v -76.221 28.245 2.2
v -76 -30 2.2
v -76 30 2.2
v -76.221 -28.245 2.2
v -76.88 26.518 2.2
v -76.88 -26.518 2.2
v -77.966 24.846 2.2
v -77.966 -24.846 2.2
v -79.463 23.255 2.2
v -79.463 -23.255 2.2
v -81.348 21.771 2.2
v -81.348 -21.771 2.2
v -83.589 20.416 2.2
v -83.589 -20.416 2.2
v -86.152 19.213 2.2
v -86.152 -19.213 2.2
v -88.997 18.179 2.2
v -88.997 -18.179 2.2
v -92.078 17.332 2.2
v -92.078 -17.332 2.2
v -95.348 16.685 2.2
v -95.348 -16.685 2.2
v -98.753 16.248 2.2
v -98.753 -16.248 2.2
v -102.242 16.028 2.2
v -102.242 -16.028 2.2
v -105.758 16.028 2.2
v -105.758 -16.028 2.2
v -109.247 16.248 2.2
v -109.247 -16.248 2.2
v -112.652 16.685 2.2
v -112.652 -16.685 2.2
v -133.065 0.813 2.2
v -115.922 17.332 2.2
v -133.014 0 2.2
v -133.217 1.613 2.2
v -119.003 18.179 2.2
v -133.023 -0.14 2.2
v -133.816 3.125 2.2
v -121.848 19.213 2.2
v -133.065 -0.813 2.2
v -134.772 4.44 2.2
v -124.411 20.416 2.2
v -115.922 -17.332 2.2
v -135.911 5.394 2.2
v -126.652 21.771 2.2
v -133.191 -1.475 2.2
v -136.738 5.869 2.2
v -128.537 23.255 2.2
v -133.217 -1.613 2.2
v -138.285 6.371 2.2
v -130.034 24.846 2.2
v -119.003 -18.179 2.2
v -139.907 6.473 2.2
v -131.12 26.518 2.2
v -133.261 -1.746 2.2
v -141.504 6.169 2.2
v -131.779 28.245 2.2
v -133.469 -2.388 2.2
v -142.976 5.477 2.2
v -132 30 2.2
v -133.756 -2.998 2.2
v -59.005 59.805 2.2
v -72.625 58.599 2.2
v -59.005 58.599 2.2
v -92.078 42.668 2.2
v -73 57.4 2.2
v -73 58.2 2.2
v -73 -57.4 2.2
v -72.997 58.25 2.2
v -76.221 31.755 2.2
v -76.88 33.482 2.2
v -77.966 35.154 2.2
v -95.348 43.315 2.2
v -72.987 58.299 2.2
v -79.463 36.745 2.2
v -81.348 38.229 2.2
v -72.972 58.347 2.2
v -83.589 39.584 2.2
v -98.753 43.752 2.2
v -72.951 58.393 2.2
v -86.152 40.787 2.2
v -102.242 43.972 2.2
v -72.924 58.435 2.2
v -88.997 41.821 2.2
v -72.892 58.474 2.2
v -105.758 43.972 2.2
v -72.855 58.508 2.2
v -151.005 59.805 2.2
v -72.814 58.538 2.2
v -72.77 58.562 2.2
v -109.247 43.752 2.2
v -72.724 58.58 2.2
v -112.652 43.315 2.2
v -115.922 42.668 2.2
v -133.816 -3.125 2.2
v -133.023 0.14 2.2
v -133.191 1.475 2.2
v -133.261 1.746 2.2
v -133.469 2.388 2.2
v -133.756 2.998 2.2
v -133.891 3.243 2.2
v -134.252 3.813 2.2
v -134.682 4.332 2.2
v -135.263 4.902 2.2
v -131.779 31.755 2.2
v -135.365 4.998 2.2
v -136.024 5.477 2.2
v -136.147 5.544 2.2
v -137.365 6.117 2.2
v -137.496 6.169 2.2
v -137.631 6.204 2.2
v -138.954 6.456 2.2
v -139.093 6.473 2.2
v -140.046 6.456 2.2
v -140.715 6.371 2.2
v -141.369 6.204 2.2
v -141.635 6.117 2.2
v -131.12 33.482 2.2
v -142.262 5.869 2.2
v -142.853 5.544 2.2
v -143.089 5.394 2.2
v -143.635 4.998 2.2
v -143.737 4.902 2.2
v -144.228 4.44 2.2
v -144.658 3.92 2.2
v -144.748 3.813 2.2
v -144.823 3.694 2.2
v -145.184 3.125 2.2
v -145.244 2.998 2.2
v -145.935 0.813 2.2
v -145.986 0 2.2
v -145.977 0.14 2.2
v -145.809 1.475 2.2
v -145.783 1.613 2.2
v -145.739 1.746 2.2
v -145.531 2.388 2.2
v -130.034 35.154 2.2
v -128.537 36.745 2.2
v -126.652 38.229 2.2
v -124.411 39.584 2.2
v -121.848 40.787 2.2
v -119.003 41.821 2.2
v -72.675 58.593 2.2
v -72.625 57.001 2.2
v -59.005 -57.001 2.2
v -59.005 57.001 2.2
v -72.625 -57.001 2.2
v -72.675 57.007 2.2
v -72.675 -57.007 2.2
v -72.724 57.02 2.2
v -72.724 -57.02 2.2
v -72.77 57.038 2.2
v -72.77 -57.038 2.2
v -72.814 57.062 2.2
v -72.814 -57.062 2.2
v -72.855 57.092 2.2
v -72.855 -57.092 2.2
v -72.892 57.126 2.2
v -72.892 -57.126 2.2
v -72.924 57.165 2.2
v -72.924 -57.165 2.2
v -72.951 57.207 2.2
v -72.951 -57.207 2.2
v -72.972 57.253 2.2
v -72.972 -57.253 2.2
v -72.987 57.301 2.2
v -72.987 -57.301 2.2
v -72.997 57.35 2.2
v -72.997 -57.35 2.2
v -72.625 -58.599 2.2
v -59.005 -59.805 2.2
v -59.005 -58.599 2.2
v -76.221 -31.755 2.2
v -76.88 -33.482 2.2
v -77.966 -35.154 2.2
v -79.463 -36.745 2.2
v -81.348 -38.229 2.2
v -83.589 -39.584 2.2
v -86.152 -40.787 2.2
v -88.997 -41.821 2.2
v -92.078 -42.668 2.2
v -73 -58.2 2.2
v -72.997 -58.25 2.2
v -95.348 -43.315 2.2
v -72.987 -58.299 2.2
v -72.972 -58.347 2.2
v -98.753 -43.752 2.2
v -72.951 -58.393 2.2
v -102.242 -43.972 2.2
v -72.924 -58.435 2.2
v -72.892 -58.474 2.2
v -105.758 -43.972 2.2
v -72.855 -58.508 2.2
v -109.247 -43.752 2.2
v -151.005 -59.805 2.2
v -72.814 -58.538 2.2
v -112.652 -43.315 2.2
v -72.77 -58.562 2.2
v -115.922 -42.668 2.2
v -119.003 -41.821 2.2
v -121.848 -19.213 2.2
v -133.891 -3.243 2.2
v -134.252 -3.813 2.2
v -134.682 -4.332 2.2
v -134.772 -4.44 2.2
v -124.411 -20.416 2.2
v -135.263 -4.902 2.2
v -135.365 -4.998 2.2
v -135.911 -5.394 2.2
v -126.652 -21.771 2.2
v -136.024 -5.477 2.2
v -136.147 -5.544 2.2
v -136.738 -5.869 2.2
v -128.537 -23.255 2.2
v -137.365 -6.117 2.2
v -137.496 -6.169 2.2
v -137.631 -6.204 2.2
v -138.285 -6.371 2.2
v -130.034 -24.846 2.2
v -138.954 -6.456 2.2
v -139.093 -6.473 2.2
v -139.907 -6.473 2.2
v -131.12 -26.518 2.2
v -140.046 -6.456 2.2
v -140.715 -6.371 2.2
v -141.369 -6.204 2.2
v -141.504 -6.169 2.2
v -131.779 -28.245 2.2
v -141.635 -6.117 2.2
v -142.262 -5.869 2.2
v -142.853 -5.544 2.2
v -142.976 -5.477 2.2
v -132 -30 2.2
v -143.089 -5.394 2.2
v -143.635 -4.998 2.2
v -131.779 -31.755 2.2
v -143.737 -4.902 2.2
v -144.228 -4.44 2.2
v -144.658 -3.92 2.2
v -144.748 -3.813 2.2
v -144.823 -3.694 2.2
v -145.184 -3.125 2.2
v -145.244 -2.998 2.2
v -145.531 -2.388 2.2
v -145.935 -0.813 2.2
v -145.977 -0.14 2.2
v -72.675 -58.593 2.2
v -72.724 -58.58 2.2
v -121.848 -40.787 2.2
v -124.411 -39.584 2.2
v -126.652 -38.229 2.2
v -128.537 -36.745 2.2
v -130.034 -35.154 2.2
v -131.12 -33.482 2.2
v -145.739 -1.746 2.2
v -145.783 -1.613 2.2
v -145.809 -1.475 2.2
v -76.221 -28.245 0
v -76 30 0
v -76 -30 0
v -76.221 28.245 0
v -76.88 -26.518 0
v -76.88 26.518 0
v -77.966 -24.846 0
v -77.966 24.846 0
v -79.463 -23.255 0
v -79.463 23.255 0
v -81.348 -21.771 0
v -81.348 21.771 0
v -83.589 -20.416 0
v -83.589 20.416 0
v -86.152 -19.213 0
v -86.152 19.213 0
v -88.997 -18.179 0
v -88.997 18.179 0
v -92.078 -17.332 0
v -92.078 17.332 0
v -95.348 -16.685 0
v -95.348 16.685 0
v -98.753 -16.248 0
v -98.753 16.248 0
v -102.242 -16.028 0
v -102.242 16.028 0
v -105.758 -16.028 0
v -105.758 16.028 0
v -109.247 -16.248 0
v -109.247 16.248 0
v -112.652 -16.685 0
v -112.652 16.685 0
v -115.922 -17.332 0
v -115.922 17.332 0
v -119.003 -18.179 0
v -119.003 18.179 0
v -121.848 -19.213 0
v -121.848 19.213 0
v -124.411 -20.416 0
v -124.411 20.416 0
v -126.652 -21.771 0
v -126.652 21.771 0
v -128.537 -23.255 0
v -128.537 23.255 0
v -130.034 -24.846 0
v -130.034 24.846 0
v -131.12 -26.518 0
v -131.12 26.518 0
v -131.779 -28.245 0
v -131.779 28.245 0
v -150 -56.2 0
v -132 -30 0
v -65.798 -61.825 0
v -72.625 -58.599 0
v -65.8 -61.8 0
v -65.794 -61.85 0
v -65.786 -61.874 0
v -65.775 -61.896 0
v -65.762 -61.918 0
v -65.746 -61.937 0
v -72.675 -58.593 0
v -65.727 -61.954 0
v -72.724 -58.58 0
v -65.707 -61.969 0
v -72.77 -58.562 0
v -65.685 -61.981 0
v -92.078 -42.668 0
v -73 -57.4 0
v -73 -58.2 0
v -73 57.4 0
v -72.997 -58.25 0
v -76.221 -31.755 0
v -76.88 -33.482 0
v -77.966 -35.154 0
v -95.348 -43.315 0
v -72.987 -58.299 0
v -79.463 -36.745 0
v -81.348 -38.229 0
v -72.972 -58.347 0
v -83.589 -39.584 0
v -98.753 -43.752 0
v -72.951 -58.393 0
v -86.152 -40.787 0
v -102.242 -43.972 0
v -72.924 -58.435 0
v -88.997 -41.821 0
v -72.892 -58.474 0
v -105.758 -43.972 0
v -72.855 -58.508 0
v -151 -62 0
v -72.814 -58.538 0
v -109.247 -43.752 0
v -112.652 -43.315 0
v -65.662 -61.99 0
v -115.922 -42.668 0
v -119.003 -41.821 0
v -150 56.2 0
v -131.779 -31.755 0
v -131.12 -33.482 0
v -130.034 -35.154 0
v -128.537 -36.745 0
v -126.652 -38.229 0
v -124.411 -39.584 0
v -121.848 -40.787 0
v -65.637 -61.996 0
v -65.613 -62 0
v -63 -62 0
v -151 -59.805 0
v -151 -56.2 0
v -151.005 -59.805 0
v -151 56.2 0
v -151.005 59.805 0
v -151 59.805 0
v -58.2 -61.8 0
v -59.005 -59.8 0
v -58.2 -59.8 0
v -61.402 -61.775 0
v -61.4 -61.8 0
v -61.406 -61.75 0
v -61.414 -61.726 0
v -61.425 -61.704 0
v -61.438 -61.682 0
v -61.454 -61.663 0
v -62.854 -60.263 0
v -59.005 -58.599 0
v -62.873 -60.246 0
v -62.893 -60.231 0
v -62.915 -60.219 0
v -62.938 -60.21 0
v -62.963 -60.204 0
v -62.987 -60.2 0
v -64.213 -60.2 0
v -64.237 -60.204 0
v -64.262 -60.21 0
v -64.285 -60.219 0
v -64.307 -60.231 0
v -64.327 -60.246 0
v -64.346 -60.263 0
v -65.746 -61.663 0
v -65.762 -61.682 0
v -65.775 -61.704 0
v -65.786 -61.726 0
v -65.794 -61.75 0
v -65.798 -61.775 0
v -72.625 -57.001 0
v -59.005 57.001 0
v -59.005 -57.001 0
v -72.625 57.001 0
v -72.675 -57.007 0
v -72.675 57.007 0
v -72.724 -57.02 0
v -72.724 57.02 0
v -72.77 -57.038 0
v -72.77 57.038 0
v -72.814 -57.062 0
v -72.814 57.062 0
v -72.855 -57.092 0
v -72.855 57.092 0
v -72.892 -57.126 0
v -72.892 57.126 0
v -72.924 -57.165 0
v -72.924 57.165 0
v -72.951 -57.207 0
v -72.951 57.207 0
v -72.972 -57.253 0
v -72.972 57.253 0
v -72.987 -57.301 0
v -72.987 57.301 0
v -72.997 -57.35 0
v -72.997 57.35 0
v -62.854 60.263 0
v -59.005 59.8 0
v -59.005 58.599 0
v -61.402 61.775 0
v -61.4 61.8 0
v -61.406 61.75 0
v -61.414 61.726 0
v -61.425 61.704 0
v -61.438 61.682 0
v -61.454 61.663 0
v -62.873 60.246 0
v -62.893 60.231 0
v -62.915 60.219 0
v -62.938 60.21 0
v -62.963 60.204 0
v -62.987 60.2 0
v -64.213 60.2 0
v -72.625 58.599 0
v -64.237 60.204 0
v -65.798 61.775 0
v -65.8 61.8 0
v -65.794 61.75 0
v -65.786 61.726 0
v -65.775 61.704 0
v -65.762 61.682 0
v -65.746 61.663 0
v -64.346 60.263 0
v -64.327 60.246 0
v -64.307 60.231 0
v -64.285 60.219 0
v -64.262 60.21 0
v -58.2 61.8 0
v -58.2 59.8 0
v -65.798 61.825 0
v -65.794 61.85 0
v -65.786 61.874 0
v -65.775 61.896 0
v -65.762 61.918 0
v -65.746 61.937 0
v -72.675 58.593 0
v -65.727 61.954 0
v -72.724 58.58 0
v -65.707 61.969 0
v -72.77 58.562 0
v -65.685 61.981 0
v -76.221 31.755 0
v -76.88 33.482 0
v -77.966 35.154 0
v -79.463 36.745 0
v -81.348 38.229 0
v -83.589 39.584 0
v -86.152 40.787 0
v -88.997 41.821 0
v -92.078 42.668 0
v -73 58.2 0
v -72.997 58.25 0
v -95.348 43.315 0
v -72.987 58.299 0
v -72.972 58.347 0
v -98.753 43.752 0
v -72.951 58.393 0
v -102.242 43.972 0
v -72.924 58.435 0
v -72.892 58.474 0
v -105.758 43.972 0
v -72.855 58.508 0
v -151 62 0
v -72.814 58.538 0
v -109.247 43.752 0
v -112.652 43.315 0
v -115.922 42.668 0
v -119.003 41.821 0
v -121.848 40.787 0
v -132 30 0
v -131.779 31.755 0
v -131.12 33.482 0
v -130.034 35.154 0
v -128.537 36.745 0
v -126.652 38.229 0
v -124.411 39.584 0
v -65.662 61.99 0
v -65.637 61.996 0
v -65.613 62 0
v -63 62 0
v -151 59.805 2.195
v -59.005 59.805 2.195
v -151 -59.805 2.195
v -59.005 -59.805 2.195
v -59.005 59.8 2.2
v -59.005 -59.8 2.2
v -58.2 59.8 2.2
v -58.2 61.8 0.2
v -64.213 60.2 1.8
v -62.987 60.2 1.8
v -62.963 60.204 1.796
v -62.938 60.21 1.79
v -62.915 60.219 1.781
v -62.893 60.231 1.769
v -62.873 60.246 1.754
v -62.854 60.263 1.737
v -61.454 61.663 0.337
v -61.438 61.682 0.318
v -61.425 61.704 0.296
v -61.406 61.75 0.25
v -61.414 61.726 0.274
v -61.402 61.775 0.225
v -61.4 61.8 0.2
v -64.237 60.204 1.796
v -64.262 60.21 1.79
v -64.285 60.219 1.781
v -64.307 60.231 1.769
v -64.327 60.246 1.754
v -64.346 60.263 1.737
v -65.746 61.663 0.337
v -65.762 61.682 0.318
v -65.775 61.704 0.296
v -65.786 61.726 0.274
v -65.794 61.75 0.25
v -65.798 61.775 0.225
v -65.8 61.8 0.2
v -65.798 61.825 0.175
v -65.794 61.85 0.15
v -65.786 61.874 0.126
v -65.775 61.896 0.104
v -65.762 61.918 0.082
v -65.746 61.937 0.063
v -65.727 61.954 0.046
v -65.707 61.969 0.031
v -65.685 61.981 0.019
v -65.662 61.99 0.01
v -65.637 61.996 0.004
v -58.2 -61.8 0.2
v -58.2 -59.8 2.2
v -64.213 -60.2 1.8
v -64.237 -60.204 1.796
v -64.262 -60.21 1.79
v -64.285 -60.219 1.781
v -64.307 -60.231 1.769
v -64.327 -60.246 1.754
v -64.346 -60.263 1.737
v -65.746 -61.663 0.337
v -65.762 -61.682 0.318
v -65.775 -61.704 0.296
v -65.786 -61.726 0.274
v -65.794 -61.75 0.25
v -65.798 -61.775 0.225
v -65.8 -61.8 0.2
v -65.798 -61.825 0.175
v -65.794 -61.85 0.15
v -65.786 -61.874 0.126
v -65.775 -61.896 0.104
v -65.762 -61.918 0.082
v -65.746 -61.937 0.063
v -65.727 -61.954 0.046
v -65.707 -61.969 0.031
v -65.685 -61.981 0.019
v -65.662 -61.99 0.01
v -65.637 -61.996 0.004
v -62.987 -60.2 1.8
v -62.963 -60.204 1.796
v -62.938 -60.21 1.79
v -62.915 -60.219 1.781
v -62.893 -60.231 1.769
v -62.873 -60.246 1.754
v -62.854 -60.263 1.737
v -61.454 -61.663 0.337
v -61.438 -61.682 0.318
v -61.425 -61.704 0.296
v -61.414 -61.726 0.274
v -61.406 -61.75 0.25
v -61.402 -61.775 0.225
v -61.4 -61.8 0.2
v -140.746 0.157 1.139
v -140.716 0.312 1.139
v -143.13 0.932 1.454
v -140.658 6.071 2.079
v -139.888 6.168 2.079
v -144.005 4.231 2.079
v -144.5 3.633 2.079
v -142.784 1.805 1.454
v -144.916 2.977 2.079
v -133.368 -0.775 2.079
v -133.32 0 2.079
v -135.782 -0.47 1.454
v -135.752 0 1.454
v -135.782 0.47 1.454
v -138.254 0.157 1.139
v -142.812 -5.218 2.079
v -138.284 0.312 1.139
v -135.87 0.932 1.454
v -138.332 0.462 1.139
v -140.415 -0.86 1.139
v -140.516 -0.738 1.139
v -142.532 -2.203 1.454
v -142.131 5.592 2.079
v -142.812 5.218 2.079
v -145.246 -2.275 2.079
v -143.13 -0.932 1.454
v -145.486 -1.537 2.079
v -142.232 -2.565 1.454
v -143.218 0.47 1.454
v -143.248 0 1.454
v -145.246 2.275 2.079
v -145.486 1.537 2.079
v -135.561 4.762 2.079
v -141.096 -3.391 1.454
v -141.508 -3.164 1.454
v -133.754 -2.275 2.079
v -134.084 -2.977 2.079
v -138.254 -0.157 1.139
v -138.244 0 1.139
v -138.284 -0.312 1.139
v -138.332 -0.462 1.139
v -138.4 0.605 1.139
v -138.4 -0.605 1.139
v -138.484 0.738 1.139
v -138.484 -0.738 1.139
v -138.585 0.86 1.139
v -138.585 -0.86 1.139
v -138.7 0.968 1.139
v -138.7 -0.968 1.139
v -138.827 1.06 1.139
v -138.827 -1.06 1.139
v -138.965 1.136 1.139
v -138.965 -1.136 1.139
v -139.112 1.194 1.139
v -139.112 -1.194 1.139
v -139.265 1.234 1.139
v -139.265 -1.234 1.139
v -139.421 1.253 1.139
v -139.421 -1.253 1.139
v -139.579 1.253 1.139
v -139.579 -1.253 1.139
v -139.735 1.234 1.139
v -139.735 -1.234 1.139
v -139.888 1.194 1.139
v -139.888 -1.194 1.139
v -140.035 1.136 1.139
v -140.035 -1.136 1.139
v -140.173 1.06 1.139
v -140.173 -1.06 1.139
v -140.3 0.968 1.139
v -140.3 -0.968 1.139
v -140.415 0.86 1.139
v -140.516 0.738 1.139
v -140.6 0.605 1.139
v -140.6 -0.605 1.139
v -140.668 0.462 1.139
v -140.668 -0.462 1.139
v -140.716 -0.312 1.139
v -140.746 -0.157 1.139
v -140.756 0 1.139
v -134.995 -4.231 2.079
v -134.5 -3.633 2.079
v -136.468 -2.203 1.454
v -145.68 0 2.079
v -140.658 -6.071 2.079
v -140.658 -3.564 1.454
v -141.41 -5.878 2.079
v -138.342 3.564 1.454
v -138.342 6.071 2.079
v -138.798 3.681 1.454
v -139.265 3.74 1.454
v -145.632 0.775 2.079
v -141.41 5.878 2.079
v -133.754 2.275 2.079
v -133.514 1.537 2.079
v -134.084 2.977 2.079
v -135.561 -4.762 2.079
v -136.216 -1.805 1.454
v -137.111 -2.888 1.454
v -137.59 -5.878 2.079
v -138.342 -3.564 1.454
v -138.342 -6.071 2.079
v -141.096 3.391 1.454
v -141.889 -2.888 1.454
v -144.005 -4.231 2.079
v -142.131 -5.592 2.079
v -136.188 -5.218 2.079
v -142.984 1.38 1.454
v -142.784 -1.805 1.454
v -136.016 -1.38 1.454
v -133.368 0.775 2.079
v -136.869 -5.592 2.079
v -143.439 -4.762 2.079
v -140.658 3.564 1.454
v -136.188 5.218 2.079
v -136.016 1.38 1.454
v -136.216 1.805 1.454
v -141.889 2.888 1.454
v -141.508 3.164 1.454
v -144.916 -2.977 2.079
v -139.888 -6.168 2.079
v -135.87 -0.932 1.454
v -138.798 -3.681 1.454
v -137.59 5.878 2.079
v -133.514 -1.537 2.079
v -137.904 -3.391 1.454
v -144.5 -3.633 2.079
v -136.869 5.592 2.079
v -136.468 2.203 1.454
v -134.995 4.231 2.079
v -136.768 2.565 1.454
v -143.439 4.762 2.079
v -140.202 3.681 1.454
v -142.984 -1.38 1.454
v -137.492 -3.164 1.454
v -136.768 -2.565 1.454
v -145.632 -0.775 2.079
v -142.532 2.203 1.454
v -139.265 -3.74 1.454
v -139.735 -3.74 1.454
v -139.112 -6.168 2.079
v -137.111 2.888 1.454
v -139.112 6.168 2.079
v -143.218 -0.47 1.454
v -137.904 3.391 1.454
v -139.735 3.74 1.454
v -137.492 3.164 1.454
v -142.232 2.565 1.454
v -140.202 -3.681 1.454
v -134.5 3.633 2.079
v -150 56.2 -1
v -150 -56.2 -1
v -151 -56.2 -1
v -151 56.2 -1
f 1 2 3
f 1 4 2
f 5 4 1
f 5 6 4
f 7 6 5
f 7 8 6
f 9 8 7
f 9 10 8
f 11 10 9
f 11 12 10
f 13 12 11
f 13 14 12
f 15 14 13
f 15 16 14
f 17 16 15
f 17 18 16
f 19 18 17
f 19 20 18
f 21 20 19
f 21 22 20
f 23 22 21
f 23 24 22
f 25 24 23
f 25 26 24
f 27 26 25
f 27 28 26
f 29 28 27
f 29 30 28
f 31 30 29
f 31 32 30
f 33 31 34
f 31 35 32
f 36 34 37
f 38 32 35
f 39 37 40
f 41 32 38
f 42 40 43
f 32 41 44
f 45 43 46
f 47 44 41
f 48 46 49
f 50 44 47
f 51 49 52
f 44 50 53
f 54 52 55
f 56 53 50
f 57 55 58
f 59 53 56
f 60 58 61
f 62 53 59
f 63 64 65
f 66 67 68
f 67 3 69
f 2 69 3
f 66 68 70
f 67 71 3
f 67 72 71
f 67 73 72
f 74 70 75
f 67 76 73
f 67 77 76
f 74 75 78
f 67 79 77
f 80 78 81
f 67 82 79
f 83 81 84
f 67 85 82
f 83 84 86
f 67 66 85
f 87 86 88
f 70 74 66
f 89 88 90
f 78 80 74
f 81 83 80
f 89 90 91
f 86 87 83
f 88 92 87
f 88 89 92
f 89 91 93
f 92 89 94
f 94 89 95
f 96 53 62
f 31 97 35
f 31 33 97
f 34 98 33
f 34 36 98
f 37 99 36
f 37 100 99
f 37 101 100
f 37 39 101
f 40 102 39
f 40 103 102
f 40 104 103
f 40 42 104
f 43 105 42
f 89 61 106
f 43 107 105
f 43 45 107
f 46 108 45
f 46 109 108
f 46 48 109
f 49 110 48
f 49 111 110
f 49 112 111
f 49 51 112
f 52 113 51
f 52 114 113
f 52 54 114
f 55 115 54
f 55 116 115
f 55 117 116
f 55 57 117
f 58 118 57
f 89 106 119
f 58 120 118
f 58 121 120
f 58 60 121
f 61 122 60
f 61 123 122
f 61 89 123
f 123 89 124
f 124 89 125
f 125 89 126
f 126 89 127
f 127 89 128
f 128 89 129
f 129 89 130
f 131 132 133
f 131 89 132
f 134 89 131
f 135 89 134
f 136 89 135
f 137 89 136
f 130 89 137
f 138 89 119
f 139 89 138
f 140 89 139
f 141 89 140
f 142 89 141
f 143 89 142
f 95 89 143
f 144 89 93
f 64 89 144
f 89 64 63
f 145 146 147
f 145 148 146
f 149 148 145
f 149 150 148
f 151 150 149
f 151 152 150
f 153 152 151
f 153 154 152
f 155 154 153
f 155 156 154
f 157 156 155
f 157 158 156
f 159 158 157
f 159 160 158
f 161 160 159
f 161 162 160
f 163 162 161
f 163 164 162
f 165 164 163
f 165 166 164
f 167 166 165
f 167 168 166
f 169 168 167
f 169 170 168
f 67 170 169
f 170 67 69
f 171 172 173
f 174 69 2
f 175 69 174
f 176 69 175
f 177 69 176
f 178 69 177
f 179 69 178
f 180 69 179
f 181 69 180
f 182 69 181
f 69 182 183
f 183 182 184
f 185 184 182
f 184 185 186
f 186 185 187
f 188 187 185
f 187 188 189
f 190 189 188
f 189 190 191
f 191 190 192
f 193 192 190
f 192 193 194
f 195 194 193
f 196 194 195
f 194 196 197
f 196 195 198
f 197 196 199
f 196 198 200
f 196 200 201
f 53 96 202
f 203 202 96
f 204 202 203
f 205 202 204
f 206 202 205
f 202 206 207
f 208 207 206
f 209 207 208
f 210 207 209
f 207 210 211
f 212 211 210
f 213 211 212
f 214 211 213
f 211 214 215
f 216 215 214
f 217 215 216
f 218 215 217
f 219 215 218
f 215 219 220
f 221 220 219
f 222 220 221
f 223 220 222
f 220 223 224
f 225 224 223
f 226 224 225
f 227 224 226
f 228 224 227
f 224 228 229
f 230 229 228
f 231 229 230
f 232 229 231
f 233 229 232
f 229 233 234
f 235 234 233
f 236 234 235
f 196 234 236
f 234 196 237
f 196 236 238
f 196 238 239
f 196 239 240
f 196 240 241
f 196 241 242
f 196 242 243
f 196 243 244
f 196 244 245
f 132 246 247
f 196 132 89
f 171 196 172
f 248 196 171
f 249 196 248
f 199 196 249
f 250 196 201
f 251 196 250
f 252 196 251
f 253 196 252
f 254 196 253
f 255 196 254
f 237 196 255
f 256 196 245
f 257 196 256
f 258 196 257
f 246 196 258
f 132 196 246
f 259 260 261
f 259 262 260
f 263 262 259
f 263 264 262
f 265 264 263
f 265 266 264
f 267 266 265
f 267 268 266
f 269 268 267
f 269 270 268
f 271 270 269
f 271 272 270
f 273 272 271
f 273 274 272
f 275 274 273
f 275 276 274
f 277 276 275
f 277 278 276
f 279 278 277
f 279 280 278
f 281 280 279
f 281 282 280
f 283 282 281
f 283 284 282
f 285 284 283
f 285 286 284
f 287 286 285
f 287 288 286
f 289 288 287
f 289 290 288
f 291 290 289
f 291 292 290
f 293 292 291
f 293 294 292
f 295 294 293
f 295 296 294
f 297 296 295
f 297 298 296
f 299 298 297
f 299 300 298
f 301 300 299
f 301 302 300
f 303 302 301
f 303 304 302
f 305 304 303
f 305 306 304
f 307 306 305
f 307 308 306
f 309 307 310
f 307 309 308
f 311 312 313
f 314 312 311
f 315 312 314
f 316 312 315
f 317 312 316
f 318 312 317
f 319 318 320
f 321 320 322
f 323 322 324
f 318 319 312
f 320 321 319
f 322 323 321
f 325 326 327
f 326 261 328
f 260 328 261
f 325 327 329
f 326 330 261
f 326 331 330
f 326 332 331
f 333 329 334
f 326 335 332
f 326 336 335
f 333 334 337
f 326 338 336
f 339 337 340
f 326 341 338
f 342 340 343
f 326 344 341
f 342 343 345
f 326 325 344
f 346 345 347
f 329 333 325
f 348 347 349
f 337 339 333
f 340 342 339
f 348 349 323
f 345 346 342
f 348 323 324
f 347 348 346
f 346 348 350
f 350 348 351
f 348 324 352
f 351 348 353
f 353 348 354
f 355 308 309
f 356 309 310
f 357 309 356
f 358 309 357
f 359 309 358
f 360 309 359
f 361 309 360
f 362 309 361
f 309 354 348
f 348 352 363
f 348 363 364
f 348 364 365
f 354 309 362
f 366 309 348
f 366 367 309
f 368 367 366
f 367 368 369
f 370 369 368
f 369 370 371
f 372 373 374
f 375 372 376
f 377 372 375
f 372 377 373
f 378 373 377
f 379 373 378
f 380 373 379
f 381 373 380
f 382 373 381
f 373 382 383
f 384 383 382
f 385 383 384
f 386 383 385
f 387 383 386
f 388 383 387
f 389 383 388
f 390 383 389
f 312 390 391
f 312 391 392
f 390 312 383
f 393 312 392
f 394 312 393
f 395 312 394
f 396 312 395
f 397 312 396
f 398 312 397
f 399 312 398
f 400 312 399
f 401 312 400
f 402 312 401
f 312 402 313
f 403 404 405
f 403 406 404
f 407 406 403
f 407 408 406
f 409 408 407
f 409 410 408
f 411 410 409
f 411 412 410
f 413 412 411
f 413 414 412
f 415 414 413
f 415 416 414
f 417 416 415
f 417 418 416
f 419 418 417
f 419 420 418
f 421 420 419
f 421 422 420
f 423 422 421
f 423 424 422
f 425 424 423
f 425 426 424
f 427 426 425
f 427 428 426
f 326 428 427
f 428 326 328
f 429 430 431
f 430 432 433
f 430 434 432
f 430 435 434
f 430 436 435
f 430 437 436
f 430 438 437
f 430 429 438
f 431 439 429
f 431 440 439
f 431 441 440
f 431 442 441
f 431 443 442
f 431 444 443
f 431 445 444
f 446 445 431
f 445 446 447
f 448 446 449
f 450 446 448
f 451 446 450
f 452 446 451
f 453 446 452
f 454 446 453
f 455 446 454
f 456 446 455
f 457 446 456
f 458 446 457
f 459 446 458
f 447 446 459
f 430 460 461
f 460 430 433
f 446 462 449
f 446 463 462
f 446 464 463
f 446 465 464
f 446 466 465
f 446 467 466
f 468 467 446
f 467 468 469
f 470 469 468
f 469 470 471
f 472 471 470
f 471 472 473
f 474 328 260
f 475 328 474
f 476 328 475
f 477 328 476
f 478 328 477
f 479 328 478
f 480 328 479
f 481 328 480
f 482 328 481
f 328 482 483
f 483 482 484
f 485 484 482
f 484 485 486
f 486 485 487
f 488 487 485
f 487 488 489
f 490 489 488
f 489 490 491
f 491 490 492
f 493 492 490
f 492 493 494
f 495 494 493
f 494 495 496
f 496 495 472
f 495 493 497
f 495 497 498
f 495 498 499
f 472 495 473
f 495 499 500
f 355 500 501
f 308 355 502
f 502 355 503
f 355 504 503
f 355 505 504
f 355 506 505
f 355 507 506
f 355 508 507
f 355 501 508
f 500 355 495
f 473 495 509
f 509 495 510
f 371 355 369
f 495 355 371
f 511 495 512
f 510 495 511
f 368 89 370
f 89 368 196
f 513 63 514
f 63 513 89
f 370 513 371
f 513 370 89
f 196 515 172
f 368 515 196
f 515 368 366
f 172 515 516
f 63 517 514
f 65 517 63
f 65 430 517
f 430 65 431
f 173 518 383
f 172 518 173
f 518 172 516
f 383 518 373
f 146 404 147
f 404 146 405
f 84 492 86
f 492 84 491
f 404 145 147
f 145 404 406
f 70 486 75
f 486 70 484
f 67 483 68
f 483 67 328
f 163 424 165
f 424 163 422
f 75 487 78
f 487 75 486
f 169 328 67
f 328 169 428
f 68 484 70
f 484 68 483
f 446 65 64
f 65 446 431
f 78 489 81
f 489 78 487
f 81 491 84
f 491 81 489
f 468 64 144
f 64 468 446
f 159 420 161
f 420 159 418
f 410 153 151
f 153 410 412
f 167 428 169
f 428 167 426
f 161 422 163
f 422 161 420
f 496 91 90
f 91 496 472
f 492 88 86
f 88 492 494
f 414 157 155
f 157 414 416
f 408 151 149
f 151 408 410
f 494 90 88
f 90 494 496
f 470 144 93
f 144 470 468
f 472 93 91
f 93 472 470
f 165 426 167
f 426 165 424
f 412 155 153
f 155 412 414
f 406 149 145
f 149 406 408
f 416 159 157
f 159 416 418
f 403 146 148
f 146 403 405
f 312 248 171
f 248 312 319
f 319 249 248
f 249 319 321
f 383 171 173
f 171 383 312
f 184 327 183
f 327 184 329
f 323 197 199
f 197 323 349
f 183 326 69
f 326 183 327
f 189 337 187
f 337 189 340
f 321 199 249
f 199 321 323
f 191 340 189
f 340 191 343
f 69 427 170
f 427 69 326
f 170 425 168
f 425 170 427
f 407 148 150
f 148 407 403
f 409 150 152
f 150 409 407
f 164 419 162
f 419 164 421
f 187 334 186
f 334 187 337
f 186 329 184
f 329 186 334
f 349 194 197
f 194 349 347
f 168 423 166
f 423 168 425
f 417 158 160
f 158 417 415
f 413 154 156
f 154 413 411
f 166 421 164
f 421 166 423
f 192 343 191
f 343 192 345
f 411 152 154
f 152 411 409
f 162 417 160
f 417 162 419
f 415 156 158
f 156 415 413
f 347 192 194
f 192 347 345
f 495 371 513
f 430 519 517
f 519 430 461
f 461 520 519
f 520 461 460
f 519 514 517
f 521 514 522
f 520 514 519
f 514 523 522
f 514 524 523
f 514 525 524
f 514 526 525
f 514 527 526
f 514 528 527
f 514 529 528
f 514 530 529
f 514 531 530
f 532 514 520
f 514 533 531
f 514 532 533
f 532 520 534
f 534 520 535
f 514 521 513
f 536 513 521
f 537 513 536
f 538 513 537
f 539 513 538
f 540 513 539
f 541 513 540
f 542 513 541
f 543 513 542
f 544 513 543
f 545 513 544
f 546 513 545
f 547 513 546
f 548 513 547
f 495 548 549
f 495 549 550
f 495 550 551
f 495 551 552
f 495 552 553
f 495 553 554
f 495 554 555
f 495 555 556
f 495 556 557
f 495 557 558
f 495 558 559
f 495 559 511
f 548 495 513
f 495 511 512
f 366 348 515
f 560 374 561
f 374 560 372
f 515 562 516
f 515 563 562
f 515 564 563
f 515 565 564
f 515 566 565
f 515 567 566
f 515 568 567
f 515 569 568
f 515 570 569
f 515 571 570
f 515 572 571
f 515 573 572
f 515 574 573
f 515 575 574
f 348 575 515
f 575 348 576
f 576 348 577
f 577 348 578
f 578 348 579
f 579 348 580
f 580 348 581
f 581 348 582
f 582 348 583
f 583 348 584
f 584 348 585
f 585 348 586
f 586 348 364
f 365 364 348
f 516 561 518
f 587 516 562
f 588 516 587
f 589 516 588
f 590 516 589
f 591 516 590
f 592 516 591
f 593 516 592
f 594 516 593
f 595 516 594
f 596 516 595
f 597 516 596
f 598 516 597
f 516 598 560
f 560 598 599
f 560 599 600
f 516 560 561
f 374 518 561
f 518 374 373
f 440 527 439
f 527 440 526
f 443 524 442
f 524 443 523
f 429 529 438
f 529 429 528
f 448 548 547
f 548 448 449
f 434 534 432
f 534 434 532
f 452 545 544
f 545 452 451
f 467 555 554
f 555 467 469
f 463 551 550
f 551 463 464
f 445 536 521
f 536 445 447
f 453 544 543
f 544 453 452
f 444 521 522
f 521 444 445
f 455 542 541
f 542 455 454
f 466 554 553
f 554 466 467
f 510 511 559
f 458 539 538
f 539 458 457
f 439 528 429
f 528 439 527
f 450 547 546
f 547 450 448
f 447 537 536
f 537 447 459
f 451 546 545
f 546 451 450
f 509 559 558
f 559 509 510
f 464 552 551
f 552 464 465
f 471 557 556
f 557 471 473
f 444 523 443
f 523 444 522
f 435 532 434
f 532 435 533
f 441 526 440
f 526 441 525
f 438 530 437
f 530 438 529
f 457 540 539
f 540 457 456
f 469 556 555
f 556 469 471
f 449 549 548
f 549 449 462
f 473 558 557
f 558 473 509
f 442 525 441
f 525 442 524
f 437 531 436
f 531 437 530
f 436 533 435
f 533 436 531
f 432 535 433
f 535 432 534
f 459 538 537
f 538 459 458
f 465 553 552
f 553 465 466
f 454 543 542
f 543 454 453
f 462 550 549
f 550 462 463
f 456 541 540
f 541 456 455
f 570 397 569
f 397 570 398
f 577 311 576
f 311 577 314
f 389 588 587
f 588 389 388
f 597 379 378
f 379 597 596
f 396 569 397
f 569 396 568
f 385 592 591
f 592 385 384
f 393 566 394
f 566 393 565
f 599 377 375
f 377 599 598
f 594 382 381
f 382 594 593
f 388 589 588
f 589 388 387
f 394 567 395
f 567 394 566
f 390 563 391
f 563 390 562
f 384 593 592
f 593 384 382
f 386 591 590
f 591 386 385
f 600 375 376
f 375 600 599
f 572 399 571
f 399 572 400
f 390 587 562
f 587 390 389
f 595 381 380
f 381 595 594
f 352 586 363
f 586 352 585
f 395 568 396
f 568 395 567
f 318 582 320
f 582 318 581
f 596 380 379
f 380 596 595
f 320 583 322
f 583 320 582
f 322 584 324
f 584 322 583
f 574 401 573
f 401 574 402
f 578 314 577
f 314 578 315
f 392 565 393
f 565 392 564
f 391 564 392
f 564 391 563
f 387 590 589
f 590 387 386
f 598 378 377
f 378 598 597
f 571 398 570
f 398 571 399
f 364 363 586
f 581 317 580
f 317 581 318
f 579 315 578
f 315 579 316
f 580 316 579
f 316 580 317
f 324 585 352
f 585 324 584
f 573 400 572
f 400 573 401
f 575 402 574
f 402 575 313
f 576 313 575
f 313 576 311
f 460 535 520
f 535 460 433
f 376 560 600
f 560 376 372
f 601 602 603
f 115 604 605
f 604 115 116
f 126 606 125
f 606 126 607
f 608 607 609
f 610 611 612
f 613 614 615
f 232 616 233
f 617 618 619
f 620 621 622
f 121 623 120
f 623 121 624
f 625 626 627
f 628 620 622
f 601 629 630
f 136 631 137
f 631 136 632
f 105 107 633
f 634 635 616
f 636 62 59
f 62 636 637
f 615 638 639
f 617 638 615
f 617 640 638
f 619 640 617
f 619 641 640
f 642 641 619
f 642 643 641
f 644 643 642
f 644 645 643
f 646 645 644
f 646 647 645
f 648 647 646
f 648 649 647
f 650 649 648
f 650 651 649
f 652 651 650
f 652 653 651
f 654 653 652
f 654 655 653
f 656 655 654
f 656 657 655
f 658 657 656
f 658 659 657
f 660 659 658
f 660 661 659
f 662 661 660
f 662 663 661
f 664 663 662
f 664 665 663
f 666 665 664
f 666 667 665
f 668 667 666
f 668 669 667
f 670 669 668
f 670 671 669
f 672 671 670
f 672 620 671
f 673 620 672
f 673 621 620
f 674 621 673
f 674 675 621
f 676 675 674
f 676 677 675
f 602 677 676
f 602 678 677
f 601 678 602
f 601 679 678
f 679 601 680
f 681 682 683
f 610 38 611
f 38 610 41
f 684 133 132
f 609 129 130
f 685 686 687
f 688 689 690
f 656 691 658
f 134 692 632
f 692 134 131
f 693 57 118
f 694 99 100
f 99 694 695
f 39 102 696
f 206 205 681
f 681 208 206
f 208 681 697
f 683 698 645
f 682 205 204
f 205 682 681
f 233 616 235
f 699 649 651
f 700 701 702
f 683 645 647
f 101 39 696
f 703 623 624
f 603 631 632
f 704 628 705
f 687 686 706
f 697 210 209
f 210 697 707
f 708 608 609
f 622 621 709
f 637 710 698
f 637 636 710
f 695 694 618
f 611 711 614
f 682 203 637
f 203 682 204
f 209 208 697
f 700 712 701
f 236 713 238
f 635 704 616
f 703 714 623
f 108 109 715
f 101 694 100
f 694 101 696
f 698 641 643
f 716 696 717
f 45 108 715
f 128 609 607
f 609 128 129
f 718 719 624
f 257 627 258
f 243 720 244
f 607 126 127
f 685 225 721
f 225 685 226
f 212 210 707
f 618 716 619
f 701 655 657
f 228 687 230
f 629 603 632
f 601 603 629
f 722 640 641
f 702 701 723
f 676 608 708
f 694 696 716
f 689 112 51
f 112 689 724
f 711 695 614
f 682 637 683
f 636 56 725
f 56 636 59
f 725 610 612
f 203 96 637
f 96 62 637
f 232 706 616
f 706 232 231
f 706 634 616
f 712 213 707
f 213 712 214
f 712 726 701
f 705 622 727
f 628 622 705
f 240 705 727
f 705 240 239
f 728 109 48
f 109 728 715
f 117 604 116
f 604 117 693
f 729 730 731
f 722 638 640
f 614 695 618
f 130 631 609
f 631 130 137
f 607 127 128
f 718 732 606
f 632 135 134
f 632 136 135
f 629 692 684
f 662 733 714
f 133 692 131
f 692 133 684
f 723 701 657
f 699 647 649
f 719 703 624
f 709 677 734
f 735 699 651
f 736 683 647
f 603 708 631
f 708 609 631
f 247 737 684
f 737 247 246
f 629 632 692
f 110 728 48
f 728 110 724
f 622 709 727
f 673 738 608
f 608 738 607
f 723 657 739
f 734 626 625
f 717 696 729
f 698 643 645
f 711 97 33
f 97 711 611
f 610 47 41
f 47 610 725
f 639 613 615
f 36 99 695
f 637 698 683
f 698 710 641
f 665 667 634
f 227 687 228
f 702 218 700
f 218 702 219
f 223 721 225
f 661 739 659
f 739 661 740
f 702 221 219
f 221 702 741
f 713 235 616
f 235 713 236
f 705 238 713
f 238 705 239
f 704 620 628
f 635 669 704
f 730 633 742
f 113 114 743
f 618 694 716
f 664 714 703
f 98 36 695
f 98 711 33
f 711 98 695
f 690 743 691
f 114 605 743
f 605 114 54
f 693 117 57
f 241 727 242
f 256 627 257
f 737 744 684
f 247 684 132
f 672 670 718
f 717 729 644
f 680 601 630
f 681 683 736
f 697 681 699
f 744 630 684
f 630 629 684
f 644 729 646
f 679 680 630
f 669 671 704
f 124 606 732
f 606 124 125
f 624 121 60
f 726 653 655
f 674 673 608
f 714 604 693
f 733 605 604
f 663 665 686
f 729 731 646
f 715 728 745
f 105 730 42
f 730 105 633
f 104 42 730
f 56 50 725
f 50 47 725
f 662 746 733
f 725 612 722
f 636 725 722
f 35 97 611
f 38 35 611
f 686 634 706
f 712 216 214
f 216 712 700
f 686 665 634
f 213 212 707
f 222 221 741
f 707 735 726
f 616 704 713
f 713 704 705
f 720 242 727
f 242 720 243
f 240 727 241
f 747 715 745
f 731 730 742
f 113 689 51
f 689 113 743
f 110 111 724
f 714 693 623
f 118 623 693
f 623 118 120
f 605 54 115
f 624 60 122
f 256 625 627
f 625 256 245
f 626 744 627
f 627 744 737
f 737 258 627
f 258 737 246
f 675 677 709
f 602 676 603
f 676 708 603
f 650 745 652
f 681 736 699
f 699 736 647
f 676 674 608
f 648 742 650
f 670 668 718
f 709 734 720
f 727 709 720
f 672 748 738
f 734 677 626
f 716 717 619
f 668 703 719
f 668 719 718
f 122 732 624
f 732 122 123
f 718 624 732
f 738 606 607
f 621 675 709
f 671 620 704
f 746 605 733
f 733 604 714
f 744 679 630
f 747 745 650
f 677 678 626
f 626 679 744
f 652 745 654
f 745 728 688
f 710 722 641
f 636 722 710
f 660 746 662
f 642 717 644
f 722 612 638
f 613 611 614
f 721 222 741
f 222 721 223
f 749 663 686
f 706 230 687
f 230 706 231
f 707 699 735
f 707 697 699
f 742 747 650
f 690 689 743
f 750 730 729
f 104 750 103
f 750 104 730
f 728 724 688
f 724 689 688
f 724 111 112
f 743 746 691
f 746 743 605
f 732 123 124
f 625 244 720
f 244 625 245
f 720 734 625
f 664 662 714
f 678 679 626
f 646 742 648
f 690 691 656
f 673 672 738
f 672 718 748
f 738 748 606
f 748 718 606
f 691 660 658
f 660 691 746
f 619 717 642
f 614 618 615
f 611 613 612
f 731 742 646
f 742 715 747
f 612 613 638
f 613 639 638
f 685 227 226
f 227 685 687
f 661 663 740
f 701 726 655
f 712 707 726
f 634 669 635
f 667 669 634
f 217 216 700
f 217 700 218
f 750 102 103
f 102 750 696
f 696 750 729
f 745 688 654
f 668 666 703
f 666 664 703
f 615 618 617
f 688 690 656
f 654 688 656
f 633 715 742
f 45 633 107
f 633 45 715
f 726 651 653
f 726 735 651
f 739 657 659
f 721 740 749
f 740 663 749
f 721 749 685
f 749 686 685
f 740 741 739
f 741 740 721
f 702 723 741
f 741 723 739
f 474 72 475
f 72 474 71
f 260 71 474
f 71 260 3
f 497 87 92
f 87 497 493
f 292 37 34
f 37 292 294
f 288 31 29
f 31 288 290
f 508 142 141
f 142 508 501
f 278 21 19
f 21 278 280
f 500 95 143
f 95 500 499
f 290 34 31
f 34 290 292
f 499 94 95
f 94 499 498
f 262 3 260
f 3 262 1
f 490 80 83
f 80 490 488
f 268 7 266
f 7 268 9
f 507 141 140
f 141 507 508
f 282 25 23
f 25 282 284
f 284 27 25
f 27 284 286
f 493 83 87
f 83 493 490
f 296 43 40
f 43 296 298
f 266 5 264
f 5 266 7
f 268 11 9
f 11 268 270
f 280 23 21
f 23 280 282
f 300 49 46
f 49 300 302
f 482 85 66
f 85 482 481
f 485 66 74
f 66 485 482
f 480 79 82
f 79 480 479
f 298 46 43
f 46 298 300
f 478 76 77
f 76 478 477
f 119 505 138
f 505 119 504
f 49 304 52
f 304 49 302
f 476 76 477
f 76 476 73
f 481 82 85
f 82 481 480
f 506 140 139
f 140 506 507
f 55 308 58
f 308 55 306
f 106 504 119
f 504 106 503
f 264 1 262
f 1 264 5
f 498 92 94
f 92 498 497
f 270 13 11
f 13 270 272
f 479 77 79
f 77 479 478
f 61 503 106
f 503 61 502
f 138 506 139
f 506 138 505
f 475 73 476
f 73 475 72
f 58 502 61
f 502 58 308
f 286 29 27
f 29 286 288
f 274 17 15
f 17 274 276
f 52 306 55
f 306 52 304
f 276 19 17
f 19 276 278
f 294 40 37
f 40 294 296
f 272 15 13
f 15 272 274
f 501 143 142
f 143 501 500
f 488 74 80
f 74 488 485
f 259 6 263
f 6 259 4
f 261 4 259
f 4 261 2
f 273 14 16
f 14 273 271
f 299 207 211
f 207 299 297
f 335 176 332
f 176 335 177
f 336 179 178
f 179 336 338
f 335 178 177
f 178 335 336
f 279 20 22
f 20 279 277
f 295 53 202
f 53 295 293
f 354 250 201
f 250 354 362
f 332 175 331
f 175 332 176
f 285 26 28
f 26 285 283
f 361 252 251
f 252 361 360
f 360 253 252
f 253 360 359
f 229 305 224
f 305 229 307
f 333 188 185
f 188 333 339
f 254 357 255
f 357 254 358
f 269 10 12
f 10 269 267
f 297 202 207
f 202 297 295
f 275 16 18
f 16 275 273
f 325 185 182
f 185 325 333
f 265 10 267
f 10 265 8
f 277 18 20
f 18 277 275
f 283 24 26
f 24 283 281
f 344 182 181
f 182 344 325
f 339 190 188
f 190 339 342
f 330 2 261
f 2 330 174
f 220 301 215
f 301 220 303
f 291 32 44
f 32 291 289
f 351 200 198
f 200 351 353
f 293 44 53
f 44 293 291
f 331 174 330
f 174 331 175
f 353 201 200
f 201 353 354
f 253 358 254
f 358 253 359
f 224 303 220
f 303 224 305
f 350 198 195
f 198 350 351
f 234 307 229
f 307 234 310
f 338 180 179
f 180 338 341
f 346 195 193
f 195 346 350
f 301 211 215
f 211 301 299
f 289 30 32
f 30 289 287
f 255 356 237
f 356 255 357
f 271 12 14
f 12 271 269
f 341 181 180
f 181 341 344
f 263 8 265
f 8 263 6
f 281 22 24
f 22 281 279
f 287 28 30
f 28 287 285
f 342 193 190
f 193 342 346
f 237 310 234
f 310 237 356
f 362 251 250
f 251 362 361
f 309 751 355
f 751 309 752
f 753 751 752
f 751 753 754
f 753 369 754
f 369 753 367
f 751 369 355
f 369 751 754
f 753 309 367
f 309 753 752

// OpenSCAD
$fn=50;

/* [Global] */

// Render
Objects = "Lid"; //  [Both, Box, Lid]

// use the following syntax to add 1 or more internal x compartment lengths (mm)
x_sizes = [90];
// use the following syntax to add 1 or more internal y compartment widths (mm)
y_sizes = [59,59];
// Total height including Lid
z_size = 20+4.2;

// Add Cylinder to each bucket for access
StdAccess = 1;
BinRounding = 1;

// Type of lid pattern
gPattern = "Tichu"; //  [Hex, Diamond, Web, Solid, Fancy, Leaf]
// Tolerance
gTol = 0.2;
// Wall Thickness
gWT = 2.0;

/* [Spider Web] */
// Amount of space from one ring or webs to the next
WebSpacing = 10;
// How many rings of webs, best of more than needed
WebStrands = 5;
// Thickness of the strands
WedThickness = 1.8;
// How many segments of web
WebWedges = 12;

/* [Hidden] */
/* Private variables */

// Box Height
RailGrip = 2.0;
RailOpeningX = 2.2;
RailWidth = RailGrip+RailOpeningX;
LidH = 2.2;
NubWidth = 1.2;
NubSize = 1.4;
NubPos = 6;
SpringOpening = 1.6;
SpringLength = 16;

function SumList(list, start, end) = (start == end) ? 0 : list[start] + SumList(list, start+1, end);
// Box Length
TotalX = SumList(x_sizes,0,len(x_sizes)) + gWT*(len(x_sizes)+1);
// Box Width 
TotalY = SumList(y_sizes,0,len(y_sizes)) + RailWidth*2 + gWT*(len(y_sizes)-1);
TotalZ = z_size;

echo("Size: ",TotalX,TotalY);
   
// Height not counting the lid
AdjBoxHeight = TotalZ - LidH;

 module regular_polygon(order, r=1){
 	angles=[ for (i = [0:order-1]) i*(360/order) ];
 	coords=[ for (th=angles) [r*cos(th), r*sin(th)] ];
 	polygon(coords);
 }

module circle_lattice(ipX, ipY, Spacing=10, Walls=1.2)  {


   intersection() {
      square([ipX,ipY]); 
      union() {
	    for (x=[-Spacing:Spacing:ipX+Spacing]) {
           for (y=[-Spacing:Spacing:ipY+Spacing]){
	          difference()  {
			     translate([x+Spacing/2, y+Spacing/2]) circle(r=Spacing*0.75);
			     translate([x+Spacing/2, y+Spacing/2]) circle(r=(Spacing*0.75)-Walls);
		      }
           }   // end for y        
	    }  // end for x
      } // End union
   }
}

module football() {
    scale([0.7,0.7])
    intersection(){
        translate([-4,0]) circle(6);
        translate([4,0]) circle(6);
    }
}

module leaf_lattice(ipX, ipY, DSize, WSize)  {
    lXOffset = 4;
    lYOffset = 22;

	difference()  {
		square([ipX, ipY]);
		for (x=[0:lXOffset:ipX]) {
            for (y=[0:lYOffset:ipY+lYOffset]){
  			   translate([x, y+(1/8*lYOffset)+0.5]) rotate([0,0,-45]) football();
			   translate([x, y+(3/8*lYOffset)]) rotate([0,0,45]) football();
  			   translate([x, y-(1/8*lYOffset)-0.5]) rotate([0,0,-45]) football();
			   translate([x, y-(3/8*lYOffset)]) rotate([0,0,45]) football();		}
        }  
	}
}


module diamond_lattice(ipX, ipY, DSize, WSize)  {

    lOffset = DSize + WSize;

	difference()  {
		square([ipX, ipY]);
		for (x=[0:lOffset:ipX]) {
            for (y=[0:lOffset:ipY]){
  			   translate([x, y])  regular_polygon(4, r=DSize/2);
			   translate([x+lOffset/2, y+lOffset/2]) regular_polygon(4, r=DSize/2);
		    }
        }        
	}
}

module hex_lattice(ipX, ipY, DSize, WSize)  {
    lXOffset = DSize + WSize;
    lYOffset = (DSize+WSize)/cos(30) * 1.5;

	difference()  {
		square([ipX, ipY]);
		for (x=[0:lXOffset:ipX]) {
            for (y=[0:lYOffset:ipY]){
  			   translate([x, y]) rotate([0,0,30]) regular_polygon(6, r=DSize/cos(30)/2);
			   translate([x+lXOffset/2, y+lYOffset/2]) rotate([0,0,30]) regular_polygon(6, r=DSize/cos(30)/2);
		    }
        }  
	}
}

// Make a star with X points
module star(radius, wedges)
{
	angle = 360 / wedges;
	difference() {
		circle(radius, $fn = wedges);
		for(i = [0:wedges - 1]) {
			rotate(angle / 2 + angle * i) translate([radius, 0, 0]) 
			    scale([0.8, 1, 1]) 
				    circle(radius * sin(angle / 2), $fn = 24);
		}
	}
}

module spider_web(ipWebSpacing, strands, ipThickness, wedges) 
{
	for(i = [0:strands - 1]) 
    {
        difference() {
            star(ipWebSpacing * i, wedges);
            offset(r = -ipThickness) star(ipWebSpacing * i, wedges);
        }
	}

	angle = 360 / wedges;
	for(i = [0:wedges - 1])
    {
		rotate(angle * i) translate([0, -ipThickness / 2, 0]) 
			square([ipWebSpacing * strands, ipThickness]);
	}    
}


module RCube(x,y,z,ipR=2) {
    translate([-x/2,-y/2,0]) hull(){
      translate([ipR,ipR,ipR]) sphere(ipR);
      translate([x-ipR,ipR,ipR]) sphere(ipR);
      translate([ipR,y-ipR,ipR]) sphere(ipR);
      translate([x-ipR,y-ipR,ipR]) sphere(ipR);
      translate([ipR,ipR,z-ipR]) sphere(ipR);
      translate([x-ipR,ipR,z-ipR]) sphere(ipR);
      translate([ipR,y-ipR,z-ipR]) sphere(ipR);
      translate([x-ipR,y-ipR,z-ipR]) sphere(ipR);
      }  
} 


module lid(ipPattern = "Hex", ipTol = 0.3){
  lAdjX = TotalX;
  lAdjY = TotalY-RailWidth*2-ipTol*2;  
  lAdjZ = LidH;
  CutX = lAdjX - 8;
  CutY = lAdjY - 8;
  lFingerX = 15;
  lFingerY = 16;  

    // add lip
    translate([-TotalX/2+1/2,0,-1/2]) cube([1,TotalY-16,1], center=true);
    
  // main square with center removed for a pattern. 0.01 addition is a kludge to avoid a 2d surface remainging when substracting the lid from the box.
  difference() {
      translate([0,0,lAdjZ/2]) cube([lAdjX+0.01, lAdjY+0.01 , lAdjZ], center=true);

      translate([0,0,lAdjZ/2]) cube([CutX, CutY, lAdjZ], center = true);
      translate([TotalX/2-gWT/2,0,LidH/2])cube([gWT+0.01,TotalY-RailWidth,LidH],center=true);

     // make a slot for the latch can flex         
     translate([TotalX/2-SpringLength/2,TotalY/2-RailWidth-SpringOpening/2-1.4,-1]) RCube(SpringLength,SpringOpening,4,0.4);
     translate([TotalX/2-SpringLength/2,-TotalY/2+RailWidth+SpringOpening/2+1.4,-1]) RCube(SpringLength,SpringOpening,4,0.4);
             
  }
  
  // The Side triangles
  difference() {
    intersection () {
      union () {
            translate([-TotalX/2,TotalY/2-RailWidth-gTol,0]) rotate([0,90,0]) 
                  linear_extrude(TotalX-1-gTol) polygon(points=[
                            [0,0],
                            [0,LidH],
                            [-RailOpeningX,0]]);
            translate([-TotalX/2,-TotalY/2+RailWidth+gTol,0]) 
                rotate([0,90,0]) 
                linear_extrude(TotalX-1-gTol) 
                polygon(points=[
                            [0,0],
                            [0,-LidH],
                            [-RailOpeningX,0]]);
              }
    }
       
        // cut notches into the railings
    translate([TotalX/2-(NubWidth+2*NubSize/2)-NubPos,TotalY/2-RailWidth+NubSize+gTol+0.2,0])
        hull(){
            translate([0,0]) cylinder(h=LidH, r = 0.2);
            translate([NubWidth+2*NubSize,0]) cylinder(h=LidH, r = 0.2);
            translate([NubWidth+NubSize,-NubSize]) cylinder(h=LidH, r = 0.2);
            translate([NubSize,-NubSize]) cylinder(h=LidH, r = 0.2);
        }


    translate([TotalX/2-(NubWidth+2*NubSize/2)-NubPos,-TotalY/2+RailWidth-NubSize-gTol-0.2,0])
         hull(){
            translate([0,0]) cylinder(h=LidH, r = 0.2);
            translate([NubWidth+2*NubSize,0]) cylinder(h=LidH, r = 0.2);
            translate([NubWidth+NubSize,NubSize]) cylinder(h=LidH, r = 0.2);
            translate([NubSize,NubSize]) cylinder(h=LidH, r = 0.2);
        }       
        
       // trim a little off the railing past the nub  TODO fix to new vars
        translate([TotalX/2,TotalY/2-LidH/2-ipTol,0]) cube([12,LidH,LidH*2],center=true); 
        translate([TotalX/2,-TotalY/2+LidH/2+ipTol,0]) cube([12,LidH,LidH*2],center=true); 
    
  }
 
  // Finger slot
  difference () {
      translate([-CutX/2,-lFingerY/2,0]) cube([lFingerX, lFingerY, lAdjZ]); 
      translate([-CutX/2+lFingerX/2,0,20+LidH/2])sphere(20);     
  }


  // Solid top
  if (ipPattern == "Solid") 
      {   
       difference (){ 
         translate([-CutX/2,-CutY/2,0]) cube([CutX, CutY,   lAdjZ]);
         translate([-CutX/2,-lFingerY/2,0]) cube([lFingerX, lFingerY, lAdjZ]); 
      }
    }
    

    
      // Tichu top
  if (ipPattern == "Tichu") 
    {   
       difference (){ 
         translate([-CutX/2,-CutY/2,0]) cube([CutX,CutY,LidH]);
         translate([-CutX/2,-lFingerY/2,0]) cube([lFingerX, lFingerY, lAdjZ]); 
         translate([0,(TotalY-2*RailWidth)/4,0]) scale([2,1,1]) cylinder(10,14,14);  
         translate([0,-(TotalY-2*RailWidth)/4,0]) scale([2,1,1]) cylinder(10,14,14);  
        }
    }

  // Leaf top
  if (ipPattern == "Leaf") 
    {   
       difference (){ 
         translate([-CutX/2,-CutY/2,0]) linear_extrude(height = lAdjZ) leaf_lattice(CutX,CutY,4,2);
         translate([-CutX/2,-lFingerY/2,0]) cube([lFingerX, lFingerY, lAdjZ]); 
      }
    }
}


module box () {
//  Main Box
  difference() {    
    translate ([0,0,AdjBoxHeight/2]) cube([TotalX,TotalY,AdjBoxHeight], center = true);

    // Scope out compartment areas
    for(nX=[0:len(x_sizes)-1])
    {
      for(nY=[0:len(y_sizes)-1])
      {
         xOffset = SumList(x_sizes,0,nX) + gWT*(nX+1) + x_sizes[nX]/2 - TotalX/2;
         yOffset = SumList(y_sizes,0,nY) + RailWidth + gWT*nY + y_sizes[nY]/2 - TotalY/2;
          
         translate([xOffset,yOffset,gWT]) RCube(x_sizes[nX], y_sizes[nY] ,AdjBoxHeight+20, BinRounding);
      }
    }
    
    // make room for lip
   translate([-TotalX/2+1/2,0,TotalZ-LidH-1/2]) cube([1.4,TotalY-14,1.4], center=true);

  }

// Left rail
    difference(){
    translate([0,TotalY/2-RailWidth/2,TotalZ-LidH/2])cube([TotalX, RailWidth, LidH], center=true);
    translate([-TotalX/2,TotalY/2-RailWidth,TotalZ-LidH]) rotate([0,90,0]) linear_extrude(TotalX) polygon(points=[
                    [0,0],
                    [0,LidH],
                    [-RailOpeningX,0]]);
    }
     
// right Rail      
    difference(){
    translate([0,-TotalY/2+RailWidth/2,TotalZ-LidH/2])cube([TotalX, RailWidth, LidH], center=true);
    translate([-TotalX/2,-TotalY/2+RailWidth,TotalZ-LidH]) 
        rotate([0,90,0]) 
        linear_extrude(TotalX) 
        polygon(points=[
                    [0,0],
                    [0,-LidH],
                    [-RailOpeningX,0]]);
    }      

    
   // add backstop
    difference(){
   translate([TotalX/2-1/2,0,TotalZ-LidH/2])cube([1,TotalY-RailWidth,LidH],center=true);
//   translate([TotalX/2-1/2,0,TotalZ-LidH/2])cube([1,TotalY-16,LidH],center=true);

    }
  
    // create the latch nubs
    translate([TotalX/2-(NubWidth+2*NubSize/2)-NubPos,+TotalY/2-RailGrip,TotalZ-LidH])
      linear_extrude(LidH) 
         polygon([
                    [0,0],
                    [NubWidth+2*NubSize,0],
                    [NubWidth+NubSize,-NubSize],
                    [NubSize,-NubSize]], paths=[[0,1,2,3]]);

    translate([TotalX/2-(NubWidth+2*NubSize/2)-NubPos,-TotalY/2+RailGrip,TotalZ-LidH])
      linear_extrude(LidH) 
         polygon([
                    [0,0],
                    [NubWidth+2*NubSize,0],
                    [NubWidth+NubSize,NubSize],
                    [NubSize,NubSize]], paths=[[0,1,2,3]]);
} 

// Production Box
if ((Objects == "Both") || (Objects == "Box")){
  intersection() {
     box();
     RCube(TotalX,TotalY,TotalZ,1);
  }
}

// Production Lid
if ((Objects == "Both")  || (Objects == "Lid")){
  translate([-TotalX - 10,0,0]) lid(ipPattern = gPattern, ipTol = gTol);
}
